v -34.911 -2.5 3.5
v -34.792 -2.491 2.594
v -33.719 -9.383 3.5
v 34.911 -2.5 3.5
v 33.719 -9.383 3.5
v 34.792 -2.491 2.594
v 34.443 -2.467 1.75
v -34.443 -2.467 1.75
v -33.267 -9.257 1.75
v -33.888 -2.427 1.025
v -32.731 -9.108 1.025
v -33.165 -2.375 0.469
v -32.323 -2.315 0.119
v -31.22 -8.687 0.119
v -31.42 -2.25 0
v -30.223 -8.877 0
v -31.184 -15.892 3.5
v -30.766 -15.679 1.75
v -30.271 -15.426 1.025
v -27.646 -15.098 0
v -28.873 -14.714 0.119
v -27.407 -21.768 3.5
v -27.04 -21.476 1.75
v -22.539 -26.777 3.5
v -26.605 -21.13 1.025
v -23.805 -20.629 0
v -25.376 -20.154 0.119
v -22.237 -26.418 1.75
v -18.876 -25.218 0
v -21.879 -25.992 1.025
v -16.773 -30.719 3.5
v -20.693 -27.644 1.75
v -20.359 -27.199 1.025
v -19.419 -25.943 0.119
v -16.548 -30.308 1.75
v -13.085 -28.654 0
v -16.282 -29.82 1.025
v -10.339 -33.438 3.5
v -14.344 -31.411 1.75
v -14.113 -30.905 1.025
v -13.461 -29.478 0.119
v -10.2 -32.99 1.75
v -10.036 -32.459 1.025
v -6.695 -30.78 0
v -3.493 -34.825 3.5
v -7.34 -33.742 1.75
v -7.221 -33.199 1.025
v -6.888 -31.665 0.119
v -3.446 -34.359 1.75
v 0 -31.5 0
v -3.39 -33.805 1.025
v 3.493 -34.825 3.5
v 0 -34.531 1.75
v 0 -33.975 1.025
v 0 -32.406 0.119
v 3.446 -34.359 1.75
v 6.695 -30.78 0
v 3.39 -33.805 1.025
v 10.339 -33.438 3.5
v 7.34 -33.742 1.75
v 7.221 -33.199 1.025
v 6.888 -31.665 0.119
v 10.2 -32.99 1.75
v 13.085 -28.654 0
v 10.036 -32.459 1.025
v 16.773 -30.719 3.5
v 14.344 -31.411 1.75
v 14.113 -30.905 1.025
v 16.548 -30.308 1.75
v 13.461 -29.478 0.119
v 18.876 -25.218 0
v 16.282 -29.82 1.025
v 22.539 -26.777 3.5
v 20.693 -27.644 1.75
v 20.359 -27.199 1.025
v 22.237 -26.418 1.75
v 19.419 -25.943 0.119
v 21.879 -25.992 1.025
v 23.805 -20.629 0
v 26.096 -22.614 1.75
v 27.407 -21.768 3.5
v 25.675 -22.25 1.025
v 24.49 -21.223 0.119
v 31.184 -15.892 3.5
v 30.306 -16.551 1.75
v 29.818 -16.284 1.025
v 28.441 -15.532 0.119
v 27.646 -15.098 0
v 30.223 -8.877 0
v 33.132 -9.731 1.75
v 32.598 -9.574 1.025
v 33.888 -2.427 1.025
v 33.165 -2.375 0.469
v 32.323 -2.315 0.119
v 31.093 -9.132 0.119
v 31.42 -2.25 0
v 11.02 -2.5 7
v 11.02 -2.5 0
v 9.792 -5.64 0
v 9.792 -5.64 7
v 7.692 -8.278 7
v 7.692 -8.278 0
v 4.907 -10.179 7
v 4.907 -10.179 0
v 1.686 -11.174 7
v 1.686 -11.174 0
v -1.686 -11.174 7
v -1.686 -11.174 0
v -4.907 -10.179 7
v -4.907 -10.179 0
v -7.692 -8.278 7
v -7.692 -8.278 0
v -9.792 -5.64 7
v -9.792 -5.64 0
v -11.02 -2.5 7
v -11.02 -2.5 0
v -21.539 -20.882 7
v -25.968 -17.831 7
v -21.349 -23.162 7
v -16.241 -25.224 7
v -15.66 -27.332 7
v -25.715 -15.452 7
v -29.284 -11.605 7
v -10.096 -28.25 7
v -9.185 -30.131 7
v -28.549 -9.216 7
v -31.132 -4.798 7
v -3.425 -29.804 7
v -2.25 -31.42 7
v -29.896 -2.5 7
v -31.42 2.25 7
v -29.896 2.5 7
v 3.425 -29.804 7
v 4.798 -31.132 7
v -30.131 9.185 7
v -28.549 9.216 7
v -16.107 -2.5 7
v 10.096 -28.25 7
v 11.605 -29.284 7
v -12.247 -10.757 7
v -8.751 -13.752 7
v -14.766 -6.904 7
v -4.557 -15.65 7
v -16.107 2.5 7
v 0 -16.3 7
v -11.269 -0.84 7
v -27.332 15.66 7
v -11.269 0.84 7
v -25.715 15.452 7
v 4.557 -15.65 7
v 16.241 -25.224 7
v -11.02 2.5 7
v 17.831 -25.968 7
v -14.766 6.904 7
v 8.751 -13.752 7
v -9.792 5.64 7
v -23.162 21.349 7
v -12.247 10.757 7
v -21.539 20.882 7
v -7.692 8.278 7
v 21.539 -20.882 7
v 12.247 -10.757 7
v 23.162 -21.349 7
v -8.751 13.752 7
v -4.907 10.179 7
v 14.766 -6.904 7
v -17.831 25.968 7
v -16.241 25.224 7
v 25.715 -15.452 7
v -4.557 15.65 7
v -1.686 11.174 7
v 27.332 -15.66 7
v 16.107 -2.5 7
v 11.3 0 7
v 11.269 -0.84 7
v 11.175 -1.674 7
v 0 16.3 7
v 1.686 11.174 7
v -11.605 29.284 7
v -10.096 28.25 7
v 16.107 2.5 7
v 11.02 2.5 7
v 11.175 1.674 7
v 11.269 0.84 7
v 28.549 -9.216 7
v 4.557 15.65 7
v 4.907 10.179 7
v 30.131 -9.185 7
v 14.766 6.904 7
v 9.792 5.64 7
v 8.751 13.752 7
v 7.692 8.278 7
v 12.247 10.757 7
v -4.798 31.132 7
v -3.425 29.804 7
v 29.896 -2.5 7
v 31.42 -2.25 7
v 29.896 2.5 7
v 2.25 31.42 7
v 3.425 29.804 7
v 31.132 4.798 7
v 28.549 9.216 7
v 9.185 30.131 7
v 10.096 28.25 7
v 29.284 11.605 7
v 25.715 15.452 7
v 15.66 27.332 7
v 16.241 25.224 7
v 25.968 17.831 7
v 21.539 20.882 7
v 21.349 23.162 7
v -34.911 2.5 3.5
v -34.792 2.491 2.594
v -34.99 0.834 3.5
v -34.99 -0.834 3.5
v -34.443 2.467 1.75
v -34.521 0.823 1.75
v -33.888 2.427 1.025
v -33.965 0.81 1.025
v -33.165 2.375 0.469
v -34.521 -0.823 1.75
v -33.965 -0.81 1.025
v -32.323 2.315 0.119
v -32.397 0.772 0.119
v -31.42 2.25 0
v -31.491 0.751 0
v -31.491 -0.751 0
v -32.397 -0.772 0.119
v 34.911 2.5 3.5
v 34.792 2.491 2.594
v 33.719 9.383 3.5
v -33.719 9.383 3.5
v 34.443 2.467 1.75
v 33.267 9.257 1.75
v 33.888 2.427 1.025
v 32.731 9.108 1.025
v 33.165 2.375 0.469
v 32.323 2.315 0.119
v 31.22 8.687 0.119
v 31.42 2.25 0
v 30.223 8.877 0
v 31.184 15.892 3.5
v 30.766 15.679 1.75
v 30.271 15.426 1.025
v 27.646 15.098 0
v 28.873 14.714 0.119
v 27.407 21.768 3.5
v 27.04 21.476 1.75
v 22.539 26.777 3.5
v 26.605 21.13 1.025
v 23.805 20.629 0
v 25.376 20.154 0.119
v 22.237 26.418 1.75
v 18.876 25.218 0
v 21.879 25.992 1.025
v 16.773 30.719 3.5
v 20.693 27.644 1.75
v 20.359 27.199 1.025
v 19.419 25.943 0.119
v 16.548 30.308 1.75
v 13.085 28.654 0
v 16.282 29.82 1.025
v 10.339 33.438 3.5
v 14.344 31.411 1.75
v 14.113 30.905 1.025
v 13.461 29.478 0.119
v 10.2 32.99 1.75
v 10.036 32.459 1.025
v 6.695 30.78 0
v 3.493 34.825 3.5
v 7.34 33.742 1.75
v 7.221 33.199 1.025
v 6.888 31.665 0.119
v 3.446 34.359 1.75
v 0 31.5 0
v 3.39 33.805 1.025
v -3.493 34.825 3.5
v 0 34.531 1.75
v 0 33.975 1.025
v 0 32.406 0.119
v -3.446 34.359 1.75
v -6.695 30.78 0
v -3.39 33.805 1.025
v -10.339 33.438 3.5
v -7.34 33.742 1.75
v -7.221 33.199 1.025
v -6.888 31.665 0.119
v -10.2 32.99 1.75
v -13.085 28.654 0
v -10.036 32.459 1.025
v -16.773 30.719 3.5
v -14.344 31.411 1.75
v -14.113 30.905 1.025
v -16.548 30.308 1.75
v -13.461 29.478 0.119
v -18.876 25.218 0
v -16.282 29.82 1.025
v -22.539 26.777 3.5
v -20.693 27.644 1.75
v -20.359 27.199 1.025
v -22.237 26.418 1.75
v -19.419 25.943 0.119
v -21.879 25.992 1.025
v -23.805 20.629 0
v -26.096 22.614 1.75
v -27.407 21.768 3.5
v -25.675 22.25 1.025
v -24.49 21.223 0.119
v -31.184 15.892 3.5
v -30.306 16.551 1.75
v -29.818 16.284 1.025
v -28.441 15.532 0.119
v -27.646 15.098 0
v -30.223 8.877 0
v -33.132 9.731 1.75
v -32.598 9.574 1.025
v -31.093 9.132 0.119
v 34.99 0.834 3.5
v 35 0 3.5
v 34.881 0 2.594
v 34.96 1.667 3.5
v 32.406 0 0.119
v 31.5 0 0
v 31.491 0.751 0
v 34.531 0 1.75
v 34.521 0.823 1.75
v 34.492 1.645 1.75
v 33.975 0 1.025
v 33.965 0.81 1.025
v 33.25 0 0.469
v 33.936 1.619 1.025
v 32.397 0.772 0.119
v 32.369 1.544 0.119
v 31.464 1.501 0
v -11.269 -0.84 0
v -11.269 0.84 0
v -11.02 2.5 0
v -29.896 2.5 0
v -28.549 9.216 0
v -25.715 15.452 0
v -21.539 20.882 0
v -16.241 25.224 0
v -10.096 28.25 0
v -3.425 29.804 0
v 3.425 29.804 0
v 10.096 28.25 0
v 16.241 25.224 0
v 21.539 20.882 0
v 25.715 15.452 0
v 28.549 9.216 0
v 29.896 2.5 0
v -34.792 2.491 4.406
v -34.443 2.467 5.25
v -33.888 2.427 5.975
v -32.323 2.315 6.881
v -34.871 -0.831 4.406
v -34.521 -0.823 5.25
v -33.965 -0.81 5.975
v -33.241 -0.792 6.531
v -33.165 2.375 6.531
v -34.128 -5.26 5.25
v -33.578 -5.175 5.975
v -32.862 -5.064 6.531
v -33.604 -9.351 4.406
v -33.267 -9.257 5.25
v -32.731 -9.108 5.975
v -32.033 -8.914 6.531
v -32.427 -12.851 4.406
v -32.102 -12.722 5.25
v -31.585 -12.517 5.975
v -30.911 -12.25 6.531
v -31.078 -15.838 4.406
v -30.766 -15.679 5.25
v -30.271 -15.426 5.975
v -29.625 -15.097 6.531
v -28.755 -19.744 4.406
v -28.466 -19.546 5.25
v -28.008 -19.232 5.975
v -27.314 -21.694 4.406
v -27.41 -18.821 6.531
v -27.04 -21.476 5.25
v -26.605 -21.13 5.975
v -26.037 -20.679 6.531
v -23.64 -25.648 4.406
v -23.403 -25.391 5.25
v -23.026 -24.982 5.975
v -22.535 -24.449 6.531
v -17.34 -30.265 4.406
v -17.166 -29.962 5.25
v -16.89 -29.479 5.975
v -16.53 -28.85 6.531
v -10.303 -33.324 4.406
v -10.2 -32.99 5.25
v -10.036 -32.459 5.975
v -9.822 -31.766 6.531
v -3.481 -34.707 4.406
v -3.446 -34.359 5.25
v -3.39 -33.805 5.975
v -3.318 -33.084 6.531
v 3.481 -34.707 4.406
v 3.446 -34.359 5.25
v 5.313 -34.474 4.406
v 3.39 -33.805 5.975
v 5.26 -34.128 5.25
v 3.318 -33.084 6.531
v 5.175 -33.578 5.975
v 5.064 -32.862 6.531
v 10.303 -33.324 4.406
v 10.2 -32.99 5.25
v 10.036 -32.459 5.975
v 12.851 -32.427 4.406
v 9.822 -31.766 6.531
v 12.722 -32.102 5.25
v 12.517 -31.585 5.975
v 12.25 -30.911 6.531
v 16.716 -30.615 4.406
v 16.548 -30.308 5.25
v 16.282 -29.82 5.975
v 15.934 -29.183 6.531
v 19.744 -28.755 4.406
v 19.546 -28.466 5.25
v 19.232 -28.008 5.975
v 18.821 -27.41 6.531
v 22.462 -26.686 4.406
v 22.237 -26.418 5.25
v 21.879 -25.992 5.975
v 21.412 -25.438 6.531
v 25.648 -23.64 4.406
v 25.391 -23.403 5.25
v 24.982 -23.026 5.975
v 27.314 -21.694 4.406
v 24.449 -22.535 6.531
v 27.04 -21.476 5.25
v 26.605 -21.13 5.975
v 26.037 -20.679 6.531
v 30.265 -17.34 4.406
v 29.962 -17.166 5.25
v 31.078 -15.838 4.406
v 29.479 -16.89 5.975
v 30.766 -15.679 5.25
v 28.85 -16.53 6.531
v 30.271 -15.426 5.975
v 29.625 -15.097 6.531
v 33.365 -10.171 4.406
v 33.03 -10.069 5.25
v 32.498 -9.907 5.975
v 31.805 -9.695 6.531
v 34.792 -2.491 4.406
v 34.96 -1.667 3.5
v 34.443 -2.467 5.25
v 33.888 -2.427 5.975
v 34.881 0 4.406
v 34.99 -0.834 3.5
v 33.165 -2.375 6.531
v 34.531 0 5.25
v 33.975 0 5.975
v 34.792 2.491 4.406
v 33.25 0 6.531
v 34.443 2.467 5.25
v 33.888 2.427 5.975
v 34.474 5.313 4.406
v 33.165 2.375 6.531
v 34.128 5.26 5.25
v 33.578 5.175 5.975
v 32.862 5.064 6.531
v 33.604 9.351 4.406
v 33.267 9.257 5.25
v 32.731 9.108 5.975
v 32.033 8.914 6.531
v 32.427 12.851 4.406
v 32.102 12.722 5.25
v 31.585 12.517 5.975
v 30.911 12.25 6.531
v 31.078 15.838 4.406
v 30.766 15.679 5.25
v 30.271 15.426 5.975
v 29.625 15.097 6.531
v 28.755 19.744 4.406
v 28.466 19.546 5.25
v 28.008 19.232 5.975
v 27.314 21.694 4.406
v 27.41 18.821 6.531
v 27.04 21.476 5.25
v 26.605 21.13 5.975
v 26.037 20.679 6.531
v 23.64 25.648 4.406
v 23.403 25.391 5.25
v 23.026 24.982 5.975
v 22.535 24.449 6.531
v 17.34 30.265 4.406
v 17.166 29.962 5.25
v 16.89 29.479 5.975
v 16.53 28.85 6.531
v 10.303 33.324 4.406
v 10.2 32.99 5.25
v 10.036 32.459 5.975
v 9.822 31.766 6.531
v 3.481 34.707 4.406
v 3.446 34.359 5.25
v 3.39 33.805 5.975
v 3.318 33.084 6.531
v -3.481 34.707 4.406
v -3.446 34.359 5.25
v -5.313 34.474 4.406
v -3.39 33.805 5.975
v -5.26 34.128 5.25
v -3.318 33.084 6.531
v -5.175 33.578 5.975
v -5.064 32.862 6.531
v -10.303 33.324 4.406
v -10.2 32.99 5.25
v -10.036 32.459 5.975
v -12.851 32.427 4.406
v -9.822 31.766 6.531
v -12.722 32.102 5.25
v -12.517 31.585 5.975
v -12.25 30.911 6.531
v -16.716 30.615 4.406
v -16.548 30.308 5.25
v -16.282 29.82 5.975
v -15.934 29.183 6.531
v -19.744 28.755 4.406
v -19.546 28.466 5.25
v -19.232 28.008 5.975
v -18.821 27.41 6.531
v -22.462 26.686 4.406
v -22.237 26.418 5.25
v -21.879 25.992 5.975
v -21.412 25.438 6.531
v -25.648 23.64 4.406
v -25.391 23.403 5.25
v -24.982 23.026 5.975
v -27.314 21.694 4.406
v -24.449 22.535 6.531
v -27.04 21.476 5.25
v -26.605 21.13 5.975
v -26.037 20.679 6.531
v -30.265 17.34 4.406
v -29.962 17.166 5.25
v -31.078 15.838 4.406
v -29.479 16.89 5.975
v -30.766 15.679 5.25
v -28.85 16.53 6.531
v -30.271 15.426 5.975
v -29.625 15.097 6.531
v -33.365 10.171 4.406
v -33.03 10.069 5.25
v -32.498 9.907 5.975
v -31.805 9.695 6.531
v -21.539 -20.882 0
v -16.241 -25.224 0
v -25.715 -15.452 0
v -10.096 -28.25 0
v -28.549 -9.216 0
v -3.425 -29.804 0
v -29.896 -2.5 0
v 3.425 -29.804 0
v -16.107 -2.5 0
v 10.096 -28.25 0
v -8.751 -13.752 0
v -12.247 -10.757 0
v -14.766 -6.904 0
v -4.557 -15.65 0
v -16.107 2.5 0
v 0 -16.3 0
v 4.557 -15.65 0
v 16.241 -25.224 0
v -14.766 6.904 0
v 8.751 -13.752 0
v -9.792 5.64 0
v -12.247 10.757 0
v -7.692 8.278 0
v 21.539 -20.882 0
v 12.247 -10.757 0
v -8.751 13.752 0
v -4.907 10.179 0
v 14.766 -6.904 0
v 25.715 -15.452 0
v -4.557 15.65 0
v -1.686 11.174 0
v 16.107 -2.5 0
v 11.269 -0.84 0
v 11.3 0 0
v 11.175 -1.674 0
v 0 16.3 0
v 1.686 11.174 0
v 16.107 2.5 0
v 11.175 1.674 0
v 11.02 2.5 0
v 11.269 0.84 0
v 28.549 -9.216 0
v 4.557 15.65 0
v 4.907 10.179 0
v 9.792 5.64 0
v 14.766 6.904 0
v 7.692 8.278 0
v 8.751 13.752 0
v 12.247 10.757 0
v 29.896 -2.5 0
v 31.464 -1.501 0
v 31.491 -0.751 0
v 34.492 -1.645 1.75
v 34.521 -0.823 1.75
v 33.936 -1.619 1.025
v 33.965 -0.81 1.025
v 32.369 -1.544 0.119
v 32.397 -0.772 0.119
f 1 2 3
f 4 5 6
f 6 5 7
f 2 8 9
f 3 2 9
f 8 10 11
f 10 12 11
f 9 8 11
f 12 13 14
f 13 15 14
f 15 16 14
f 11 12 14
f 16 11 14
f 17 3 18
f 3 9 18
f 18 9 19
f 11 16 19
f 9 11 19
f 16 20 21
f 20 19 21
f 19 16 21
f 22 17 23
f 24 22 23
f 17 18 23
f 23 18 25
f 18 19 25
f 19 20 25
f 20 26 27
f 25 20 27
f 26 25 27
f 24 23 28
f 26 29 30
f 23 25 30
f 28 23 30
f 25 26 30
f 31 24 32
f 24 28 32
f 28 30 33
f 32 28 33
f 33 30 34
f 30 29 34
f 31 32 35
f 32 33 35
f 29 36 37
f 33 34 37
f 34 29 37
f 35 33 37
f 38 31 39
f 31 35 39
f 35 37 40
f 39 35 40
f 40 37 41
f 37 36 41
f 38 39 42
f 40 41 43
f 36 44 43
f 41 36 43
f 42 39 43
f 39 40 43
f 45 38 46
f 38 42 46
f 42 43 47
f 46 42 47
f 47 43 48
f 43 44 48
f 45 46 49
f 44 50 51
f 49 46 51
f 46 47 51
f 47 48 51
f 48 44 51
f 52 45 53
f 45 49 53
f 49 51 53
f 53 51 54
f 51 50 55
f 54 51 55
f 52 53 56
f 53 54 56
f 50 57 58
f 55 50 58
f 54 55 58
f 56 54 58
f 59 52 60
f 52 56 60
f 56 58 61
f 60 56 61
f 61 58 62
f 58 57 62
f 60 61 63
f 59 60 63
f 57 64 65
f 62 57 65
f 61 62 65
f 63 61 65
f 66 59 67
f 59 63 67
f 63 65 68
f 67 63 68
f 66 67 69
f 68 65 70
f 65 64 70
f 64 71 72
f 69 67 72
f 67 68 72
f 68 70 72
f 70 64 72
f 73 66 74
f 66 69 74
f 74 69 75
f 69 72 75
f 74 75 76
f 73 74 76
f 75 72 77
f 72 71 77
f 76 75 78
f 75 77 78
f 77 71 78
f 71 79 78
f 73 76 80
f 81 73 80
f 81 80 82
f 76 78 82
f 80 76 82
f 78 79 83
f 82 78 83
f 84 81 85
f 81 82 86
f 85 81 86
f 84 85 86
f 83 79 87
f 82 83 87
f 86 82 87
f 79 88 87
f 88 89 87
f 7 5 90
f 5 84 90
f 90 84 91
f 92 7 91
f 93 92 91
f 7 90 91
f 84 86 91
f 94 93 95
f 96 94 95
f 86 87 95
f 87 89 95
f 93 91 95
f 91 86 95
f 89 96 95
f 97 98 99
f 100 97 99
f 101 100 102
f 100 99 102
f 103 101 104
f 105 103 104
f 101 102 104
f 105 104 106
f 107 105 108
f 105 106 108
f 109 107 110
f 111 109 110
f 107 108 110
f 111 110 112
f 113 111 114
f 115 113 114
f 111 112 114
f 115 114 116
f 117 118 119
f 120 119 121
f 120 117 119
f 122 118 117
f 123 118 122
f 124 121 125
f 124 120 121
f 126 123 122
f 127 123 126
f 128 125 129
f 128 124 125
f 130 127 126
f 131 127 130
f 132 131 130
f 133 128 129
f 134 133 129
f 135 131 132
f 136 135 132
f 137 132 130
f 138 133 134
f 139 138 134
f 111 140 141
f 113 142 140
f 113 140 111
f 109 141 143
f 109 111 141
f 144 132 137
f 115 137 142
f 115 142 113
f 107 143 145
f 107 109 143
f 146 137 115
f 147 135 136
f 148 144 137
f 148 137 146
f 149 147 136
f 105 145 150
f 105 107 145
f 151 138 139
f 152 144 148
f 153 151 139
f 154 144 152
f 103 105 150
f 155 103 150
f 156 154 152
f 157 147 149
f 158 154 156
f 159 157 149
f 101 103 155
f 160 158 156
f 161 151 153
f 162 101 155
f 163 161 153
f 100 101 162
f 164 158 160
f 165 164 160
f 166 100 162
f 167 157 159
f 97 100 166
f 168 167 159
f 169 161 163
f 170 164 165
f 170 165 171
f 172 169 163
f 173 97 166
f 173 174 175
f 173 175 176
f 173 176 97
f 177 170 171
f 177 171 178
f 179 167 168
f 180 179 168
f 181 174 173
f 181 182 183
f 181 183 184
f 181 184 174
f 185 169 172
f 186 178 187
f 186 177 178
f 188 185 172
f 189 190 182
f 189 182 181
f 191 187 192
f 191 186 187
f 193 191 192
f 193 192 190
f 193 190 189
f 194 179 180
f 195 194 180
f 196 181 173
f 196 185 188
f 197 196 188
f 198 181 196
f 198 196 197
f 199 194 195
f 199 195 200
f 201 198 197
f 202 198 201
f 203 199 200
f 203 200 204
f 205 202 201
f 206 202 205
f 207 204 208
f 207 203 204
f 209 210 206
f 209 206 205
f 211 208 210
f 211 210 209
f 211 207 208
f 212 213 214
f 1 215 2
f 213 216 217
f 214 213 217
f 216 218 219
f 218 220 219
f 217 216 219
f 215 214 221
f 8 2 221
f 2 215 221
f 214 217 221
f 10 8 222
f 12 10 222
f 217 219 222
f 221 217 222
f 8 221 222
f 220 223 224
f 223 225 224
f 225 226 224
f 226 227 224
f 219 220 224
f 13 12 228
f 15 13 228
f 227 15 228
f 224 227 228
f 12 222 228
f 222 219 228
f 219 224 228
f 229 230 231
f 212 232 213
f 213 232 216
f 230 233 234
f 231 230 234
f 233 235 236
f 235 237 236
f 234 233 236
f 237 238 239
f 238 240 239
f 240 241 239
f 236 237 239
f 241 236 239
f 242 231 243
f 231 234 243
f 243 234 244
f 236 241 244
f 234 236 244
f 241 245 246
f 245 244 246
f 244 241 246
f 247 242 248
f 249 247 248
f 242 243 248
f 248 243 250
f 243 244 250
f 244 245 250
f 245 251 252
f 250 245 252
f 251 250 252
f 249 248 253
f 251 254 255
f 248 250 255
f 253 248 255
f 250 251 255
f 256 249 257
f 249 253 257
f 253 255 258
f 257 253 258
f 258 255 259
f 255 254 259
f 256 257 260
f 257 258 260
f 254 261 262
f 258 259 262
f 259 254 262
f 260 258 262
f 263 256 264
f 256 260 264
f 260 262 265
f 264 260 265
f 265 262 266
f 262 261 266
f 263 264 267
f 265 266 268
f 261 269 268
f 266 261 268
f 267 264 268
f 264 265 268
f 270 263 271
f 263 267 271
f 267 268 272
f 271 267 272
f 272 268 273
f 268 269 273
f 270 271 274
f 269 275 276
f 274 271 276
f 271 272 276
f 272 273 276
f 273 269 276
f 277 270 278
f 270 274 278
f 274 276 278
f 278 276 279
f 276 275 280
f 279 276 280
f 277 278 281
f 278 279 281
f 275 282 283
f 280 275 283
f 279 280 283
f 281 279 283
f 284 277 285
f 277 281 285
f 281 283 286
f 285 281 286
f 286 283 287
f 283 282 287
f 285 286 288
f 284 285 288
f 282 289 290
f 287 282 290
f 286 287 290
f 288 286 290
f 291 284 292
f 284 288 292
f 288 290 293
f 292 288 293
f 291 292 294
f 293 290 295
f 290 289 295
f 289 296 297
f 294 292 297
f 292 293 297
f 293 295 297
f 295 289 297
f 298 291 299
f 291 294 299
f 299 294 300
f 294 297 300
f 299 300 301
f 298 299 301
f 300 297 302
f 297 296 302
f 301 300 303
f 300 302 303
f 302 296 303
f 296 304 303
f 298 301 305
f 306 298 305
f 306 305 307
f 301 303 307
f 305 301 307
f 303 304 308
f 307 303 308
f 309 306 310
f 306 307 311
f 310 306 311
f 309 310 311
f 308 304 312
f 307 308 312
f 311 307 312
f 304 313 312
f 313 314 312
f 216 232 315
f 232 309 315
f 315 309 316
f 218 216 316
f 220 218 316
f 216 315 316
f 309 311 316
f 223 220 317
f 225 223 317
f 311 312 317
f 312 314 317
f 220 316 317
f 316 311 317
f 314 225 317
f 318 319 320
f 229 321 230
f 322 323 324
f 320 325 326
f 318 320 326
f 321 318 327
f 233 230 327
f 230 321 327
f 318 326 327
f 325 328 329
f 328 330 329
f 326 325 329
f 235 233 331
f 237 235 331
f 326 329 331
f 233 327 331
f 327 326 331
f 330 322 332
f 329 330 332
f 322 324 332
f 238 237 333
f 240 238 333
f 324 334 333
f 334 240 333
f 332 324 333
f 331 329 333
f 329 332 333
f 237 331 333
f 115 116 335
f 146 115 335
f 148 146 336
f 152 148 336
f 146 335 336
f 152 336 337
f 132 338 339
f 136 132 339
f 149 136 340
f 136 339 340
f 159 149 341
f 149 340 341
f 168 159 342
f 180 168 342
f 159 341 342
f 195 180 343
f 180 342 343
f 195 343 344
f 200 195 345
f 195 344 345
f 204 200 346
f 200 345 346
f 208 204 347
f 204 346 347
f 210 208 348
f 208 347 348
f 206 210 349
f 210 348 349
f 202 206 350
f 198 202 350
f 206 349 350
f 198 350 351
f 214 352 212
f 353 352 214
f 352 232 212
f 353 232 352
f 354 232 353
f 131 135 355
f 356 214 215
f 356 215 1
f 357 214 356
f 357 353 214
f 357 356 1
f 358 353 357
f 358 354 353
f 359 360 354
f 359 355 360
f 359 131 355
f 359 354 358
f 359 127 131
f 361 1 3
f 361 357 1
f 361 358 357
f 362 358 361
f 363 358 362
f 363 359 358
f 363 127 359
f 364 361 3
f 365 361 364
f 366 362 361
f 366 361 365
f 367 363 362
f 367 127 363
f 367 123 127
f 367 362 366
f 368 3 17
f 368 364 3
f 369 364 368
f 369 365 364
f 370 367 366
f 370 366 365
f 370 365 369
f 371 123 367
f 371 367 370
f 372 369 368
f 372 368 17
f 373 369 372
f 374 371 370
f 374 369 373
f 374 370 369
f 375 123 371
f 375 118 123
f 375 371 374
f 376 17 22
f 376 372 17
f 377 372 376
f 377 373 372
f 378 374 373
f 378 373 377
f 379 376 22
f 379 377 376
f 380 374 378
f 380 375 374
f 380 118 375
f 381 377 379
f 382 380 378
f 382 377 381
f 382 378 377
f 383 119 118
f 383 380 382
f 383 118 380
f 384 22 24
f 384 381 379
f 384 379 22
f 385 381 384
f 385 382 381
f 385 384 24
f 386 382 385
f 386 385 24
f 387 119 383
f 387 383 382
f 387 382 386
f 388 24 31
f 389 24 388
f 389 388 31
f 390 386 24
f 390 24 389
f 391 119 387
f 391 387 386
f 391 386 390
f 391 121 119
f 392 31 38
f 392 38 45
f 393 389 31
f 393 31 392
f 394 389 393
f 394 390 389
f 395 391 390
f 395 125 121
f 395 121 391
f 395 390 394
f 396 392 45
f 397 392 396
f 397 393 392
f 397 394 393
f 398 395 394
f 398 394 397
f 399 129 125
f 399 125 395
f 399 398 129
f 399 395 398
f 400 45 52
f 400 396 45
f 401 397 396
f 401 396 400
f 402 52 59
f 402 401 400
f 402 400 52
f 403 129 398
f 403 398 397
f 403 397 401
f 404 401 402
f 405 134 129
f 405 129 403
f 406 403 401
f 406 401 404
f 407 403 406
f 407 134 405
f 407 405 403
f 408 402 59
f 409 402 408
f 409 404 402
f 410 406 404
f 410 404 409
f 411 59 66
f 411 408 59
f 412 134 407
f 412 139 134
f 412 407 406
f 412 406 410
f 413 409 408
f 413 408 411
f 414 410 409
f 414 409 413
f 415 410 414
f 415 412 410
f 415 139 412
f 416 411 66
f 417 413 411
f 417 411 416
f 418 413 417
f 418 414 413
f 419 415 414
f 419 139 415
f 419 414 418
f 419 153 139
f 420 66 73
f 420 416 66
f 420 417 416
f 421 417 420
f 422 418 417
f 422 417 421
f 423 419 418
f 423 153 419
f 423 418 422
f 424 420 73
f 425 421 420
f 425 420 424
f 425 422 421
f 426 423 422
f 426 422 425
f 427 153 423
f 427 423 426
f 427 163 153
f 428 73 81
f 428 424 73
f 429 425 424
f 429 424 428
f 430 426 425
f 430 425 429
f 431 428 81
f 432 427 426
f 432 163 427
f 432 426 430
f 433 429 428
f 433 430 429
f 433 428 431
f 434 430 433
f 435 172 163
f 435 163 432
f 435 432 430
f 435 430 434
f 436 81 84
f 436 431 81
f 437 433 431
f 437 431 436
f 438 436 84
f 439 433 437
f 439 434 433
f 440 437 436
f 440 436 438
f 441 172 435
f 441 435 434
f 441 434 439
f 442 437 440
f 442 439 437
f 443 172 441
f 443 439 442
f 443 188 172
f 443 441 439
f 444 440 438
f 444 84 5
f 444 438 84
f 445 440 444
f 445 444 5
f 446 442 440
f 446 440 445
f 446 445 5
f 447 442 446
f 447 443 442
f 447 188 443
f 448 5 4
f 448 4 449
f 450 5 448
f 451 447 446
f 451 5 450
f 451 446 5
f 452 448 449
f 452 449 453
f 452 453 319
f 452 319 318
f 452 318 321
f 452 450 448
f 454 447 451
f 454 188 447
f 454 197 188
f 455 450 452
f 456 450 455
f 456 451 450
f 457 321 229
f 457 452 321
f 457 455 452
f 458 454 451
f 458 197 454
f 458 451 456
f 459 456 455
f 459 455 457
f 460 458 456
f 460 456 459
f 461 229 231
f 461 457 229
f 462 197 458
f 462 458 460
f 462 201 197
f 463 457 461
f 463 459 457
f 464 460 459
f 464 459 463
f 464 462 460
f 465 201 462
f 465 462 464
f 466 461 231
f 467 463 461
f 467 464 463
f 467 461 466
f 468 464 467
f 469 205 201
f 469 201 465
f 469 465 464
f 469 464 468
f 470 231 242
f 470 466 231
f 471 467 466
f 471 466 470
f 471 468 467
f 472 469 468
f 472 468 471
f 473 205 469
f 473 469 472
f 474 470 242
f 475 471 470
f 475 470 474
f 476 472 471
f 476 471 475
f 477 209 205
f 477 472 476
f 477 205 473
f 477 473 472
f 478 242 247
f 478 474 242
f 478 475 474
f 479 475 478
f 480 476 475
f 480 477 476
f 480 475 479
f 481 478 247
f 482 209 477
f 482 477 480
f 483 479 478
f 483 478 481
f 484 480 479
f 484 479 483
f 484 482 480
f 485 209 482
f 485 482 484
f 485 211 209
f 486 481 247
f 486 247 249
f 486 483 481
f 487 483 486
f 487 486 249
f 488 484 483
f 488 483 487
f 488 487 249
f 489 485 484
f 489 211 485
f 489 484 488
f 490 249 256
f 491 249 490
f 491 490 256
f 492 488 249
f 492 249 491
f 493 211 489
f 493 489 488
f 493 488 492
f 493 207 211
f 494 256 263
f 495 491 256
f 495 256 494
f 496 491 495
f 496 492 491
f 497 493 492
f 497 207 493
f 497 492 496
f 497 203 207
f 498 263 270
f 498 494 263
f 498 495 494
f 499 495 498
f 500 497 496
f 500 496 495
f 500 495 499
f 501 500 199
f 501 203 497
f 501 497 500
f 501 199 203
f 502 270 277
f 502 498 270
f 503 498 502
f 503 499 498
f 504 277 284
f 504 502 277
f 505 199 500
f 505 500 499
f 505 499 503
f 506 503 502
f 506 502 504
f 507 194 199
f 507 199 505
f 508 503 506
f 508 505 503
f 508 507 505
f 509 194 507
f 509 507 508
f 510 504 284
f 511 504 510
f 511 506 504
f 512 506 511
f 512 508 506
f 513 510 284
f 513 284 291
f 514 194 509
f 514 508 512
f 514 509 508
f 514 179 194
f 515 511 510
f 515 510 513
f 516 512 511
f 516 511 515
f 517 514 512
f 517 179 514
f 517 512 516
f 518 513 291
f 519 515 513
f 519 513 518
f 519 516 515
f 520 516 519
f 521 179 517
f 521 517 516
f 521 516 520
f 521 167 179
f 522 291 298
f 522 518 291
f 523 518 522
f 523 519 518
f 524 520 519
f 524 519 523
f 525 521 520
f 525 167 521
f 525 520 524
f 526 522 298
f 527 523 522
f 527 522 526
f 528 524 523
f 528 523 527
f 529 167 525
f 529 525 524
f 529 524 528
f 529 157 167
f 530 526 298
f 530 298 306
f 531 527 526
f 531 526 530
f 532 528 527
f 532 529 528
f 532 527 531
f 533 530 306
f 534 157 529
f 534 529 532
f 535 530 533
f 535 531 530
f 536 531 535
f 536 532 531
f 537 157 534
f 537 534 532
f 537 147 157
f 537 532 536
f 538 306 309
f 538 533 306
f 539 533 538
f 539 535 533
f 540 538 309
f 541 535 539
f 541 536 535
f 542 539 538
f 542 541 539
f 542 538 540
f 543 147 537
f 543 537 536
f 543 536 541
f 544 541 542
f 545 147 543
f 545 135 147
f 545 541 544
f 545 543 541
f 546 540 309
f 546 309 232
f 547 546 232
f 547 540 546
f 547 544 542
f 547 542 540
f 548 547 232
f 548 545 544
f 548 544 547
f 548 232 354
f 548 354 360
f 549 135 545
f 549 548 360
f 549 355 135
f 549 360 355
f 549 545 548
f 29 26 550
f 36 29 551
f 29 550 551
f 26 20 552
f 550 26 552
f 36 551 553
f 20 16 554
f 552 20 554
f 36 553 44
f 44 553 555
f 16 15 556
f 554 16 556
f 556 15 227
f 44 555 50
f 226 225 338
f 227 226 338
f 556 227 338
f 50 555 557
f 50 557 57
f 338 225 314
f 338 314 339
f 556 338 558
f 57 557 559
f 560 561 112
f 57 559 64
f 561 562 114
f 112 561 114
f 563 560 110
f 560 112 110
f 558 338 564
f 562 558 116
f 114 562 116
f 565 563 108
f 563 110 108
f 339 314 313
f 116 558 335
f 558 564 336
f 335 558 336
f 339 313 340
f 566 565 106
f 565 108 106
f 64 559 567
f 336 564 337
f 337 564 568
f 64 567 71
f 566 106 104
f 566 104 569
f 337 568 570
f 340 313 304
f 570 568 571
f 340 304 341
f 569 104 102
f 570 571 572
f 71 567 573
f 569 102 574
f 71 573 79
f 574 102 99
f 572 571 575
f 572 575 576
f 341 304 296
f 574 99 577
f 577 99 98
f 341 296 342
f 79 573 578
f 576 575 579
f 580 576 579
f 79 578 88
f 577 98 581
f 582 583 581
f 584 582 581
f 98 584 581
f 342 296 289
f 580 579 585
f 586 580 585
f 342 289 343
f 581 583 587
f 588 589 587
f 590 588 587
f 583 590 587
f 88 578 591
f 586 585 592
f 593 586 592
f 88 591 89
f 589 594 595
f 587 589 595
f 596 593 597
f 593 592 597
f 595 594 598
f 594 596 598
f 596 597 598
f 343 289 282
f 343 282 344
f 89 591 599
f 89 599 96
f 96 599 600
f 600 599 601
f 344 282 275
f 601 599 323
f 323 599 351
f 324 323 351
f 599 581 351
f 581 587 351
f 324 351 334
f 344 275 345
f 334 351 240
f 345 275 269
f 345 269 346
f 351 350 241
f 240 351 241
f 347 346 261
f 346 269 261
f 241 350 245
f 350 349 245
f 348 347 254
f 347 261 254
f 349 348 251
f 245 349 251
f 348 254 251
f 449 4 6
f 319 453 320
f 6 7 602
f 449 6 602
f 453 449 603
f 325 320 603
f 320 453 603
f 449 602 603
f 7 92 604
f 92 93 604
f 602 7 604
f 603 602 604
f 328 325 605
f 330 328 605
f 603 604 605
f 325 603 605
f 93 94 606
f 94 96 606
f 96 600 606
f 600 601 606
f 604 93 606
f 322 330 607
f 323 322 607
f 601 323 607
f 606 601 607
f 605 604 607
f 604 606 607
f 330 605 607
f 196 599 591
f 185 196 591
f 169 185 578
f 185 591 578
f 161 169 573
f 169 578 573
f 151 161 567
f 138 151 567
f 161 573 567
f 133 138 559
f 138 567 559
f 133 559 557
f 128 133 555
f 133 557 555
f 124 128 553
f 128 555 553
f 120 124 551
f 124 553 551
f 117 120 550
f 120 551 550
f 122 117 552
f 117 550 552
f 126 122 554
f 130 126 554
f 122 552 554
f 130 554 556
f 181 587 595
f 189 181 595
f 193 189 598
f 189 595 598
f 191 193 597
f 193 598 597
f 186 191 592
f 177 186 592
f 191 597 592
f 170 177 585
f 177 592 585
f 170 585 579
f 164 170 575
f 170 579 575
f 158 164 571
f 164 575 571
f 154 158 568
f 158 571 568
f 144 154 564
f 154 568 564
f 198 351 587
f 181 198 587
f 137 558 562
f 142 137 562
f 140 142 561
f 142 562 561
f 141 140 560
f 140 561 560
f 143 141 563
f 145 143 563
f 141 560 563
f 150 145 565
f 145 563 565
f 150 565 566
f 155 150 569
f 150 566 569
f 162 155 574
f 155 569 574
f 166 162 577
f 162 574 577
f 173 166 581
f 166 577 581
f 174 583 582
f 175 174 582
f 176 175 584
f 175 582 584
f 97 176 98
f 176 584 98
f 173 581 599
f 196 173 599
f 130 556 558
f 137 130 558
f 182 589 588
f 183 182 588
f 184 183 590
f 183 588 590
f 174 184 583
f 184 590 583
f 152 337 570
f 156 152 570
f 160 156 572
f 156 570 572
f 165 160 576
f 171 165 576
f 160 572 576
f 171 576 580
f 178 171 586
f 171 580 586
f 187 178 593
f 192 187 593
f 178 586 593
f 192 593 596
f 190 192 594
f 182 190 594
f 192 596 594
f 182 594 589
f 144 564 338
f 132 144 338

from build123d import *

# Parameters (mm, degrees)
F1_DEPTH = 7
F3_R     = 3.49999


# Not quite as in the source:
# - a fillet or chamfer that OpenCascade refuses, or shapes differently, is made with other operations: its cross-section is extruded or revolved along the edge and cut away or added
# - a fillet or chamfer is up to 0.001 mm smaller than in the source, because OpenCascade refuses the exact size


with BuildPart() as f1:
    # F0 (on Top) → F1 (new body)
    with BuildSketch(Plane.XY):
        with BuildLine():
            ThreePointArc((-29.8956518578, 2.5), (0, 30), (29.8956518578, 2.5))
            Line((29.8956518578, 2.5), (34.9106001094, 2.5))
            ThreePointArc((34.9106001094, 2.5), (0, 35), (-34.9106001094, 2.5))
            Line((-34.9106001094, 2.5), (-29.8956518578, 2.5))
        make_face()
        with BuildLine():
            Line((34.9106001094, 2.5), (29.8956518578, 2.5))
            ThreePointArc((29.8956518578, 2.5), (29.9739016123, 1.2510883797), (30, 0))
            ThreePointArc((30, 0), (29.9739016123, -1.2510883797), (29.8956518578, -2.5))
            Line((29.8956518578, -2.5), (34.9106001094, -2.5))
            ThreePointArc((34.9106001094, -2.5), (34.9776428868, -1.2507989787), (35, 0))
            ThreePointArc((35, 0), (34.9776428868, 1.2507989787), (34.9106001094, 2.5))
        make_face()
        with BuildLine():
            Line((34.9106001094, -2.5), (29.8956518578, -2.5))
            ThreePointArc((29.8956518578, -2.5), (0, -30), (-29.8956518578, -2.5))
            Line((-29.8956518578, -2.5), (-34.9106001094, -2.5))
            ThreePointArc((-34.9106001094, -2.5), (0, -35), (34.9106001094, -2.5))
        make_face()
        with BuildLine():
            ThreePointArc((-29.8956518578, -2.5), (-30, 0), (-29.8956518578, 2.5))
            Line((-29.8956518578, 2.5), (-34.9106001094, 2.5))
            ThreePointArc((-34.9106001094, 2.5), (-35, 0), (-34.9106001094, -2.5))
            Line((-34.9106001094, -2.5), (-29.8956518578, -2.5))
        make_face()
        with BuildLine():
            ThreePointArc((-16.1071412734, -2.5), (-16.3, 0), (-16.1071412734, 2.5))
            Line((-16.1071412734, 2.5), (-29.8956518578, 2.5))
            ThreePointArc((-29.8956518578, 2.5), (-30, 0), (-29.8956518578, -2.5))
            Line((-29.8956518578, -2.5), (-16.1071412734, -2.5))
        make_face()
        with BuildLine():
            ThreePointArc((-11.0199818512, -2.5), (-11.3, 0), (-11.0199818512, 2.5))
            Line((-11.0199818512, 2.5), (-16.1071412734, 2.5))
            ThreePointArc((-16.1071412734, 2.5), (-16.3, 0), (-16.1071412734, -2.5))
            Line((-16.1071412734, -2.5), (-11.0199818512, -2.5))
        make_face()
        with BuildLine():
            ThreePointArc((-11.0199818512, 2.5), (0, 11.3), (11.0199818512, 2.5))
            Line((11.0199818512, 2.5), (16.1071412734, 2.5))
            ThreePointArc((16.1071412734, 2.5), (0, 16.3), (-16.1071412734, 2.5))
            Line((-16.1071412734, 2.5), (-11.0199818512, 2.5))
        make_face()
        with BuildLine():
            Line((16.1071412734, -2.5), (11.0199818512, -2.5))
            ThreePointArc((11.0199818512, -2.5), (0, -11.3), (-11.0199818512, -2.5))
            Line((-11.0199818512, -2.5), (-16.1071412734, -2.5))
            ThreePointArc((-16.1071412734, -2.5), (0, -16.3), (16.1071412734, -2.5))
        make_face()
        with BuildLine():
            Line((29.8956518578, 2.5), (16.1071412734, 2.5))
            ThreePointArc((16.1071412734, 2.5), (16.2517137982, 1.2537139315), (16.3, 0))
            ThreePointArc((16.3, 0), (16.2517137982, -1.2537139315), (16.1071412734, -2.5))
            Line((16.1071412734, -2.5), (29.8956518578, -2.5))
            ThreePointArc((29.8956518578, -2.5), (29.9739016123, -1.2510883797), (30, 0))
            ThreePointArc((30, 0), (29.9739016123, 1.2510883797), (29.8956518578, 2.5))
        make_face()
        with BuildLine():
            ThreePointArc((11.0199818512, 2.5), (11.2297772667, 1.2578165768), (11.3, 0))
            ThreePointArc((11.3, 0), (11.2297772667, -1.2578165768), (11.0199818512, -2.5))
            Line((11.0199818512, -2.5), (16.1071412734, -2.5))
            ThreePointArc((16.1071412734, -2.5), (16.2517137982, -1.2537139315), (16.3, 0))
            ThreePointArc((16.3, 0), (16.2517137982, 1.2537139315), (16.1071412734, 2.5))
            Line((16.1071412734, 2.5), (11.0199818512, 2.5))
        make_face()
    extrude(amount=F1_DEPTH)

    # F2: fillet of radius 3.5 on 1 edges, made by hand

    # F2_s1 → F2_t2 (revolve, cut)
    with BuildSketch(Plane(origin=(0, 0, 0), x_dir=(0, 0, 1), z_dir=(0.0714285714, 0.9974457174, 0))):
        with BuildLine():
            ThreePointArc((3.5, -35), (5.9748737342, -33.9748737342), (7, -31.5))
            Line((7, -31.5), (7, -35))
            Line((7, -35), (3.5, -35))
        make_face()
    revolve(axis=Axis((0, 0, 7), (0, 0, 1)), mode=Mode.SUBTRACT)

    # F3 (radius 3.5 in the source; OpenCascade refuses exactly that, so slightly less here)
    f3_edges = [f1.edges().sort_by_distance(p)[0] for p in [
        (34.9106, -2.5, 0),
    ]]
    fillet(f3_edges, radius=F3_R)


solid = f1.part
